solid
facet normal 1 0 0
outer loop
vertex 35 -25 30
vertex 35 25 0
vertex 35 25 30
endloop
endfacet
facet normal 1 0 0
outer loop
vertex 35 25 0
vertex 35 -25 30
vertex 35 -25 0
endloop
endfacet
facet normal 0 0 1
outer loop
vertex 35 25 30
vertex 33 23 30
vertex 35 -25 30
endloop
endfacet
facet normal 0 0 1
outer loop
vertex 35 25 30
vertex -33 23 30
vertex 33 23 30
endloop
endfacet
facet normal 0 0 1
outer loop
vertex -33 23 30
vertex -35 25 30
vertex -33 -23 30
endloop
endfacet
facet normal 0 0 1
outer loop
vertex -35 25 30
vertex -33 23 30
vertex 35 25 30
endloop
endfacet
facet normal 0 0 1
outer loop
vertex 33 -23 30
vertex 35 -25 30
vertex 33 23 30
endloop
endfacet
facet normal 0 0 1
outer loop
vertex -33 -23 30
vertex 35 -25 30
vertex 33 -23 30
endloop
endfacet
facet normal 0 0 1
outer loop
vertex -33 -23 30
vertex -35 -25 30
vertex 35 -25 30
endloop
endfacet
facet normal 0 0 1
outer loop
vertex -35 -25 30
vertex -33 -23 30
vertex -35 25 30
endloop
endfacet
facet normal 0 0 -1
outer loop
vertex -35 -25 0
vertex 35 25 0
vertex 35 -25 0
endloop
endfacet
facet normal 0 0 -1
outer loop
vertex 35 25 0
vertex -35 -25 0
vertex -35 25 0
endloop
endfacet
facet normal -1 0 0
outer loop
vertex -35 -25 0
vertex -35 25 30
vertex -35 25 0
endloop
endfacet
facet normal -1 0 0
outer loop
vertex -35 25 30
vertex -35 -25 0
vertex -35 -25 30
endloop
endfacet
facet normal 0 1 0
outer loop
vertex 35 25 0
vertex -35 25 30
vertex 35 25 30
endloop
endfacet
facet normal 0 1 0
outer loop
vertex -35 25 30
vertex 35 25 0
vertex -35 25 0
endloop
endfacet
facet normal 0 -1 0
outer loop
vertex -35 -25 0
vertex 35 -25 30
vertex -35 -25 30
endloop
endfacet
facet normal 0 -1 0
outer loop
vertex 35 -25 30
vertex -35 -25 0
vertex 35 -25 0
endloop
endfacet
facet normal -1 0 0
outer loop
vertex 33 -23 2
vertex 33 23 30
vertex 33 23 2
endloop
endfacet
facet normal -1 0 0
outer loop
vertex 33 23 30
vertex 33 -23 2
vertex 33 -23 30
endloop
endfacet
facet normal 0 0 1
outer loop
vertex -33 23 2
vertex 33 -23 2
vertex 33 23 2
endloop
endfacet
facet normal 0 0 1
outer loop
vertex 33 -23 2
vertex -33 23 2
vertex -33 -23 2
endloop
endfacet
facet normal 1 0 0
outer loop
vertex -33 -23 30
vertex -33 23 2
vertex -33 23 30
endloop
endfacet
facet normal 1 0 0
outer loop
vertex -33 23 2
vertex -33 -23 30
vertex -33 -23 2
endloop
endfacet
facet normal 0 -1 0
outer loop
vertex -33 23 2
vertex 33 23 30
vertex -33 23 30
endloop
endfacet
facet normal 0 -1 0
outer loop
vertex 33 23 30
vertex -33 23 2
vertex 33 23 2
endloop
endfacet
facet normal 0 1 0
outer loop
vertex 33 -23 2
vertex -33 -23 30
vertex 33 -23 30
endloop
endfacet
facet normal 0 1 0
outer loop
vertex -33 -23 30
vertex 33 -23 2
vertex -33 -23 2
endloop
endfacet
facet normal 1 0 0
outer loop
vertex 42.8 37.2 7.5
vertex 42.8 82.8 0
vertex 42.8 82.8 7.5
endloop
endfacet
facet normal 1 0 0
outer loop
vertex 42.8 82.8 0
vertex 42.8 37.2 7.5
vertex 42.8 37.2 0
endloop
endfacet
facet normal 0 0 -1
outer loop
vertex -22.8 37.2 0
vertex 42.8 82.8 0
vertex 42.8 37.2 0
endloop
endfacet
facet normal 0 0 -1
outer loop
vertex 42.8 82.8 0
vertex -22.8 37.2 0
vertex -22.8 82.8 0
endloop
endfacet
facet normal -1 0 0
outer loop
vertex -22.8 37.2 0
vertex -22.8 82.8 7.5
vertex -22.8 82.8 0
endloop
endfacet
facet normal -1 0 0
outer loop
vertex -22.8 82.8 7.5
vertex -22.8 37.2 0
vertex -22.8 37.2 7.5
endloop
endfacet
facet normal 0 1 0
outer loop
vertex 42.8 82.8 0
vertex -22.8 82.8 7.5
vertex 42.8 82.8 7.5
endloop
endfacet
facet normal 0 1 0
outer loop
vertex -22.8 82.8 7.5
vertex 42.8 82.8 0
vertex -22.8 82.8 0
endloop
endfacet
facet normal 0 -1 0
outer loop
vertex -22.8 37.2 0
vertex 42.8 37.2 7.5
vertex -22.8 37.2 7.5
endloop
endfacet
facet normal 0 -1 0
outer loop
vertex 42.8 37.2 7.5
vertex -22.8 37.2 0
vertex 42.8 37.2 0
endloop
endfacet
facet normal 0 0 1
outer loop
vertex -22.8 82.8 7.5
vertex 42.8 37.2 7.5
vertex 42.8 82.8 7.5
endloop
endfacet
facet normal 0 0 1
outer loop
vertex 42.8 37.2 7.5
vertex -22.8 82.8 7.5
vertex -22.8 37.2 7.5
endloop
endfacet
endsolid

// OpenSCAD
// Two-part enclosure for small electronics board
// Print orientation: box standing on bed, lid upside down (plate on bed)

$fn = 64;

// ---- Box ----
box_x = 70;      // outer length (X)
box_y = 50;      // outer width (Y)
box_z = 30;      // outer height (Z)
wall = 2;        // wall thickness
floor = 2;       // floor thickness

// ---- Lid ----
lip_w = 65.6;    // lip outer length (X)
lip_d = 45.6;    // lip outer width (Y)
lip_h = 1.5;     // lip height (wall thickness)
lip_t = 4;       // lip top thickness

// ---- Misc ----
eps = 0.5;       // cutter overshoot
gap = 10;        // gap between parts on bed

// Derived
inner_x = box_x - 2*wall;
inner_y = box_y - 2*wall;
lip_total_h = lip_h + lip_t;   // lip top at z = floor + lip_total_h

module box() {
    difference() {
        translate([-box_x/2, -box_y/2, 0])
            cube([box_x, box_y, box_z]);
        // open-top cavity
        translate([-inner_x/2, -inner_y/2, floor])
            cube([inner_x, inner_y, box_z - floor + eps]);
    }
}

module lid() {
    translate([gap - lip_w/2, -lip_d/2, 0])
        union() {
            // plate
            cube([lip_w, lip_d, 2]);
            // lip
            translate([0, 0, 2])
                cube([lip_w, lip_d, lip_total_h]);
        }
}

box();
translate([0, box_y + gap, 0])
    lid();
